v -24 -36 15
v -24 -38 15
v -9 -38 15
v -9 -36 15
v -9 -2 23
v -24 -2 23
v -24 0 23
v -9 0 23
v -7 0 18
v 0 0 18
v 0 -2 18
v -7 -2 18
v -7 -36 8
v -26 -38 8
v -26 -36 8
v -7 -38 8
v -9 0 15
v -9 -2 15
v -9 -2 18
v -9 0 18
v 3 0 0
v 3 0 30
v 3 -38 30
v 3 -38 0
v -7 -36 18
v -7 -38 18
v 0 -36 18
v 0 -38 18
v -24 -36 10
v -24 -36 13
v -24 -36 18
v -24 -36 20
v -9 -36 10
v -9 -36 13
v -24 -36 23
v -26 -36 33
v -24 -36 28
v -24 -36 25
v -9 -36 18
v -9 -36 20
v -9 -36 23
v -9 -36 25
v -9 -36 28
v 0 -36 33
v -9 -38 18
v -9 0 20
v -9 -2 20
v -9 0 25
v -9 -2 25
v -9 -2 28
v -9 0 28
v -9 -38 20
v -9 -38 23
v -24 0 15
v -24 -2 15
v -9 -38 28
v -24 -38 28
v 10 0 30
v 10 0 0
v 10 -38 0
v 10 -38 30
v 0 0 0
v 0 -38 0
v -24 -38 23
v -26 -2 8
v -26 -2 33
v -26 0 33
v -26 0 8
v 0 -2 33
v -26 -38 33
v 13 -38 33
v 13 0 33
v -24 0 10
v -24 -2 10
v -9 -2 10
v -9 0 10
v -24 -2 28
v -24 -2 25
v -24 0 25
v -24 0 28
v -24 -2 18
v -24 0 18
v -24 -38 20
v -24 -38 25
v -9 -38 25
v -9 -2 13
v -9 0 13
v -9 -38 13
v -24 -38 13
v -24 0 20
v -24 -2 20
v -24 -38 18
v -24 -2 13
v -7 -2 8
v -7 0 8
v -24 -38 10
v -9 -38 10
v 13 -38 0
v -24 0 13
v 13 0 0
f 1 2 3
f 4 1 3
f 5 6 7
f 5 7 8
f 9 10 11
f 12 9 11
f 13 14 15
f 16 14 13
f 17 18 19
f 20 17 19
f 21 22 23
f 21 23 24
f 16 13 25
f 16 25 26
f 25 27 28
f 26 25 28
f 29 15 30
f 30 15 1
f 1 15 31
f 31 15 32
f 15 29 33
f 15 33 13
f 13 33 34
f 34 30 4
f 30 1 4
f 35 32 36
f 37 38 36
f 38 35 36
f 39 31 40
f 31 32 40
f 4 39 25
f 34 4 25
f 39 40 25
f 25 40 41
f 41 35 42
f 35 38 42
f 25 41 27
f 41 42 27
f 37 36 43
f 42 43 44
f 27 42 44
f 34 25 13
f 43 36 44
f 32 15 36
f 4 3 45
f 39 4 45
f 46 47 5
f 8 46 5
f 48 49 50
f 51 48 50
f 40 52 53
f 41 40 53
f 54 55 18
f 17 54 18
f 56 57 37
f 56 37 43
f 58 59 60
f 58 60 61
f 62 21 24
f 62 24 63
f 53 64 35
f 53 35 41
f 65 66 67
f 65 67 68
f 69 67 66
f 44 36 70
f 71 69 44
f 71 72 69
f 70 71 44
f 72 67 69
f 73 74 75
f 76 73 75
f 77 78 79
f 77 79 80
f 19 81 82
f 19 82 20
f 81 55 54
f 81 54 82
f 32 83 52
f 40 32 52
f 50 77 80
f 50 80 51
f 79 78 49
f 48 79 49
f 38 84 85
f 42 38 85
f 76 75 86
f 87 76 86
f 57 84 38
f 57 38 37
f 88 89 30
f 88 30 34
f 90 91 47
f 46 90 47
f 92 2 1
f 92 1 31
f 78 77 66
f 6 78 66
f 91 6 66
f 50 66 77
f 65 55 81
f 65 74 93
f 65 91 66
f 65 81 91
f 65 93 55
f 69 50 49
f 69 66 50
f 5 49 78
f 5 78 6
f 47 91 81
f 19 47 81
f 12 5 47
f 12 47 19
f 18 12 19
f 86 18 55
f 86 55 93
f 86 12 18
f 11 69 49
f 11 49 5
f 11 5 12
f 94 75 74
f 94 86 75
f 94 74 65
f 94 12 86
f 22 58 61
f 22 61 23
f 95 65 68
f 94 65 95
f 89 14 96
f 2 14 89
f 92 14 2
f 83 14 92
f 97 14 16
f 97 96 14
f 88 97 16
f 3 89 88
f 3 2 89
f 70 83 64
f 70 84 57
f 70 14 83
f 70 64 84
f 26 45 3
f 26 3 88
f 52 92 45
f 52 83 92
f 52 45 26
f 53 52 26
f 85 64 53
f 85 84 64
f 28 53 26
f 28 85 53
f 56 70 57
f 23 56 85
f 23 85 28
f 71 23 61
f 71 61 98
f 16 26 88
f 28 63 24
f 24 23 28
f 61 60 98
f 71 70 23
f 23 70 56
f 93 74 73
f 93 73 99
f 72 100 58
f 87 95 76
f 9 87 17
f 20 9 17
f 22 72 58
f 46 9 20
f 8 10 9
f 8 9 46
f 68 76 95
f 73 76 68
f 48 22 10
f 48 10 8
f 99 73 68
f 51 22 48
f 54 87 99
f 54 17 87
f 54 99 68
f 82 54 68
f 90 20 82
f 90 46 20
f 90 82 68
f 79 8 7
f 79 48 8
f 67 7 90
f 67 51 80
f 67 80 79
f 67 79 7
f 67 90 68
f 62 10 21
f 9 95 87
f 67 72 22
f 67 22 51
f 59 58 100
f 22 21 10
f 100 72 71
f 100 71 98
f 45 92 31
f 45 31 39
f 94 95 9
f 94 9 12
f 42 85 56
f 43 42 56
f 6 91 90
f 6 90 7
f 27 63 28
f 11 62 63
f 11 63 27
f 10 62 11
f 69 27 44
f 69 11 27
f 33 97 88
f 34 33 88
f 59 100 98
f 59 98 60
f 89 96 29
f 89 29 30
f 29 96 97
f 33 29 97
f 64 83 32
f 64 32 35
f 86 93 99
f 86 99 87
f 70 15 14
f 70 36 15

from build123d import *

# Parameters (mm, degrees)
PAD_DEPTH    = 38
SKETCH001_W  = 15
SKETCH001_H  = 2
PAD001_DEPTH = 26
SKETCH002_W  = 19
SKETCH002_H  = 2
PAD002_DEPTH = 10
SKETCH003_W  = 15
SKETCH003_H  = 3
POCKET_DEPTH = 40


with BuildPart() as part:
    # Sketch → Pad (new body)
    with BuildSketch(Plane.XZ):
        Polygon((0, 0), (0, 33), (13, 33), (13, 0), (10, 0), (10, 30), (3, 30), (3, 0), align=None)
    extrude(amount=PAD_DEPTH)

    # Sketch001 (on Face1 of Pad) → Pad001 (join)
    with BuildSketch(Plane(origin=(0, 0, 0), x_dir=(0, 0, -1), z_dir=(-1, 0, 0))):
        with Locations((-25.5, 37)):
            Rectangle(SKETCH001_W, SKETCH001_H)
        with Locations((-25.5, 1)):
            Rectangle(SKETCH001_W, SKETCH001_H)
    extrude(amount=PAD001_DEPTH)

    # Sketch002 (on Face7 of Pad001) → Pad002 (join)
    with BuildSketch(Plane(origin=(0, 0, 18), x_dir=(1, 0, 0), z_dir=(0, 0, -1))):
        with Locations((-16.5, 37)):
            Rectangle(SKETCH002_W, SKETCH002_H)
        with Locations((-16.5, 1)):
            Rectangle(SKETCH002_W, SKETCH002_H)
    extrude(amount=PAD002_DEPTH)

    # Sketch003 (on Face30 of Pad002) → Pocket (cut)
    with BuildSketch(Plane.XZ.offset(38)):
        with Locations((-16.5, 11.5)):
            Rectangle(SKETCH003_W, SKETCH003_H)
        with Locations((-16.5, 16.5)):
            Rectangle(SKETCH003_W, SKETCH003_H)
        with Locations((-16.5, 21.5)):
            Rectangle(SKETCH003_W, SKETCH003_H)
        with Locations((-16.5, 26.5)):
            Rectangle(SKETCH003_W, SKETCH003_H)
    extrude(amount=-POCKET_DEPTH, mode=Mode.SUBTRACT)


solid = part.part
